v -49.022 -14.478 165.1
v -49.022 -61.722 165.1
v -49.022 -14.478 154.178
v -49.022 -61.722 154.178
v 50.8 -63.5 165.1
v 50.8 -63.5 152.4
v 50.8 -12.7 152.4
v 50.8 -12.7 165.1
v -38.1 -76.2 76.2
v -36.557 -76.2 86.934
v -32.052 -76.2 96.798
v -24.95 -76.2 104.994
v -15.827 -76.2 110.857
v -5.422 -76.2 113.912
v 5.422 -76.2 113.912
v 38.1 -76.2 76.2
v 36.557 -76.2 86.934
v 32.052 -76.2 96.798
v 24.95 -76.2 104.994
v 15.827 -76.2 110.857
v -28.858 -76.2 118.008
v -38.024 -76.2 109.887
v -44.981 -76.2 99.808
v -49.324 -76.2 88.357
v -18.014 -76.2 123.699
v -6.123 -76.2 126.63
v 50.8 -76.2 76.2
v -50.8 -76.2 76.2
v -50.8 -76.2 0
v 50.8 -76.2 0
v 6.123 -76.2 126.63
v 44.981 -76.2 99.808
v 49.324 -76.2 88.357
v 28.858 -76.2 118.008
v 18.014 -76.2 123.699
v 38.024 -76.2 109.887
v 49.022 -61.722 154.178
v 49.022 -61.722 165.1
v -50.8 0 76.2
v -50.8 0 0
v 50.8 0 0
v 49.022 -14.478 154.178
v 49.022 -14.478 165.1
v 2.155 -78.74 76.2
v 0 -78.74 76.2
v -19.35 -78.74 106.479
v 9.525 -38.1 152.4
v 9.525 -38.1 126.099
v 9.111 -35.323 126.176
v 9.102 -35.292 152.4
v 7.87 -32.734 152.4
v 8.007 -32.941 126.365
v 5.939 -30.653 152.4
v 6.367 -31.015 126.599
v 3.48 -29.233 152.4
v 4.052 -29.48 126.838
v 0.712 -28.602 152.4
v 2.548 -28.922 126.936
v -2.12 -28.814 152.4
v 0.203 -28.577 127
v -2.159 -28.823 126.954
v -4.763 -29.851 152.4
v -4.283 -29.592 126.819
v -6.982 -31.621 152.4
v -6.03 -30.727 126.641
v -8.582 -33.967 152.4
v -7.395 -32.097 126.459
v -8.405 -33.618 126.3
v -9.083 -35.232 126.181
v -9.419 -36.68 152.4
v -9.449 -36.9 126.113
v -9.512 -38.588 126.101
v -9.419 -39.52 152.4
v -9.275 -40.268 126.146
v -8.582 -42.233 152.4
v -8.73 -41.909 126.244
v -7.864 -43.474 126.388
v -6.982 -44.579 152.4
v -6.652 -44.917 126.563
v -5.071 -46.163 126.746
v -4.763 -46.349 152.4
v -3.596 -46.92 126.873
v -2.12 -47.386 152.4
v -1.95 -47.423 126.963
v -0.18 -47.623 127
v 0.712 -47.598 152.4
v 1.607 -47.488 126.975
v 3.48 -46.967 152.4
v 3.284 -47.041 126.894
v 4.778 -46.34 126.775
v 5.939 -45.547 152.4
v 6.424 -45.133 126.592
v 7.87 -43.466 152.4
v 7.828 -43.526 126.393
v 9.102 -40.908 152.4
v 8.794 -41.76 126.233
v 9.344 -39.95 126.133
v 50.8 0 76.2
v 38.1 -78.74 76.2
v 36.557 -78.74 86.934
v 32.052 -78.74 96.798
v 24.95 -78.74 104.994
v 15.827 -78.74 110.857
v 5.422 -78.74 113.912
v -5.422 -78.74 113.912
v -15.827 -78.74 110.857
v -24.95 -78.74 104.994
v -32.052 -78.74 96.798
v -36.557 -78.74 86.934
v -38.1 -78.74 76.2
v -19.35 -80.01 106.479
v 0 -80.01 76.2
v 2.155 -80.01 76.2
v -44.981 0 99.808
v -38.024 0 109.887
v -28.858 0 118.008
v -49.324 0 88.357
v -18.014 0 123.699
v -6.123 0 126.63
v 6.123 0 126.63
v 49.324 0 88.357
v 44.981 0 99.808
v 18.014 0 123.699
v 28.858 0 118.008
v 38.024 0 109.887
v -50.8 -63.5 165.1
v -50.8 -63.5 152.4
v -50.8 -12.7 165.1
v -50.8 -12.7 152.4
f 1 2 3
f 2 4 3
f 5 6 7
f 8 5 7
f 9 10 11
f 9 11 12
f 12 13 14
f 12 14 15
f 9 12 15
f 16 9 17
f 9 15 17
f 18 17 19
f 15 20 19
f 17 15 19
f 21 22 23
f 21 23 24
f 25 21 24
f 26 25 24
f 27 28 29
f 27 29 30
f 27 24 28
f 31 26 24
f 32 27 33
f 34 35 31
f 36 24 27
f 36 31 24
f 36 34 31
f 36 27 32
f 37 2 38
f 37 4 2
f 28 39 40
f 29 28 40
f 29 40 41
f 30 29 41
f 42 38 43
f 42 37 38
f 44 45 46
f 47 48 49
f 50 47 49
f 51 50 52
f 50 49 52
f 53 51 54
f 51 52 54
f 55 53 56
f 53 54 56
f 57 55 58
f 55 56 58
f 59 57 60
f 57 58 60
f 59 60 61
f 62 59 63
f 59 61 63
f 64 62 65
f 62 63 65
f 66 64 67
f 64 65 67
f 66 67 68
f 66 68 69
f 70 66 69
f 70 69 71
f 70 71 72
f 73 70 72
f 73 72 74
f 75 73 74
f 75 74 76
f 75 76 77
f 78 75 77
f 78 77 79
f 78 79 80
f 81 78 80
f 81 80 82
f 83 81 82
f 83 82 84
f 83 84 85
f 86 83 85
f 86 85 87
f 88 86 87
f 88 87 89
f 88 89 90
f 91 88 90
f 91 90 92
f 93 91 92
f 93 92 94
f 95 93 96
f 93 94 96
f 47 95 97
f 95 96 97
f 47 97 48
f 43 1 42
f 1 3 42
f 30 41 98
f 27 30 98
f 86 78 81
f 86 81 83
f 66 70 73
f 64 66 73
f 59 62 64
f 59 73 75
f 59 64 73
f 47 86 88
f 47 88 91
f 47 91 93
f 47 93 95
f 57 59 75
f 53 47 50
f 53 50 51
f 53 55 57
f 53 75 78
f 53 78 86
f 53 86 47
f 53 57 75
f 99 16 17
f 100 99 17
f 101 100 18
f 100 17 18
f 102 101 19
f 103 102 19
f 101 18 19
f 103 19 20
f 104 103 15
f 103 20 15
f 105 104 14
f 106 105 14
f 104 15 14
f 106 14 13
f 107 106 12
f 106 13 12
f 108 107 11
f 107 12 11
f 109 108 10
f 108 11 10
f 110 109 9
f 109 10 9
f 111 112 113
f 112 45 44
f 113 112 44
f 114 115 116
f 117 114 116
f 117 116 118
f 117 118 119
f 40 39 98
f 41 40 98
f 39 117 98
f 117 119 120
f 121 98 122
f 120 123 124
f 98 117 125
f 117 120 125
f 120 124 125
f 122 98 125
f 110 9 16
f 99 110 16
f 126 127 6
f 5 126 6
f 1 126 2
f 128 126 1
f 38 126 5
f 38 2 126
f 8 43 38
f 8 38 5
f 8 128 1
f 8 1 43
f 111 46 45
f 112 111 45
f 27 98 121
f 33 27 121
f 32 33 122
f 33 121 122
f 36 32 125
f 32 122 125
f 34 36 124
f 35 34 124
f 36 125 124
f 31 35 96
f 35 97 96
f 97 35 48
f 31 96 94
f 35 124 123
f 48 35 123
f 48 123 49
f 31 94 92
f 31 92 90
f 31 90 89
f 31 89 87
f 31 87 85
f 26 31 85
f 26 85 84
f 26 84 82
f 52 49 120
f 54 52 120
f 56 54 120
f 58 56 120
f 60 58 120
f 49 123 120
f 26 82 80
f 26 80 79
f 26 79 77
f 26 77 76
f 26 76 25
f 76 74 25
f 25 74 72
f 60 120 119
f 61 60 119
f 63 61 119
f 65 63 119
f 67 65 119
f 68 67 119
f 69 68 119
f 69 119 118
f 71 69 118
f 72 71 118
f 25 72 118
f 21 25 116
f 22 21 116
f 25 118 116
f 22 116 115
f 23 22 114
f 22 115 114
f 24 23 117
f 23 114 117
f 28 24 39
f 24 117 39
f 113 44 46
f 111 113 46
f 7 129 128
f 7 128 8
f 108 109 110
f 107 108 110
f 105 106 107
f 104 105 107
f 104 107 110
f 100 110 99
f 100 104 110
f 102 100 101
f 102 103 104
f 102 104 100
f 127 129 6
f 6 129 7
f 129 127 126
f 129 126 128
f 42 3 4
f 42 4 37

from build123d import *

# Parameters (mm, degrees)
F1_DEPTH = 76.2
F3_DEPTH = 2.54
F5_DEPTH = 1.27
F6_R     = 9.525
F7_DEPTH = 152.4
F8_W     = 101.6
F8_H     = 50.8
F8_R     = 9.525
F9_DEPTH = 12.7
F10_T    = -1.778


with BuildPart() as f1:
    # F0 (on Front) → F1 (new body)
    with BuildSketch(Plane.XZ):
        with BuildLine():
            Line((-50.8, 76.2), (-50.8, 0))
            Line((-50.8, 0), (50.8, 0))
            Line((50.8, 0), (50.8, 76.2))
            ThreePointArc((50.8, 76.2), (0, 127), (-50.8, 76.2))
        make_face()
    extrude(amount=F1_DEPTH)

    # F6 (on Top) → F7 (join)
    with BuildSketch(Plane.XY):
        with Locations((0, -38.1)):
            Circle(F6_R)
    extrude(amount=F7_DEPTH)


with BuildPart() as f3:
    # F2 (on face) → F3 (new body)
    with BuildSketch(Plane.XZ.offset(76.2)):
        with BuildLine():
            ThreePointArc((38.1, 76.2), (0, 114.3), (-38.1, 76.2))
            Line((-38.1, 76.2), (38.1, 76.2))
        make_face()
    extrude(amount=F3_DEPTH)


with BuildPart() as f5:
    # F4 (on face) → F5 (new body)
    with BuildSketch(Plane.XZ.offset(78.74)):
        Polygon((-19.35011, 106.478661), (0, 76.2), (2.154625, 76.2), align=None)
    extrude(amount=F5_DEPTH)


with BuildPart() as f9:
    # F8 (on face) → F9 (new body)
    with BuildSketch(Plane.XY.offset(152.4)):
        with Locations((0, -38.1)):
            Rectangle(F8_W, F8_H)
        with Locations((0, -38.1)):
            Circle(F8_R, mode=Mode.SUBTRACT)
        with Locations((0, -38.1)):
            Circle(F8_R)
    extrude(amount=F9_DEPTH)

    # F10
    f10_openings = [f9.faces().sort_by_distance(p)[0] for p in [
        (0, -38.1, 165.1),
    ]]
    offset(amount=F10_T, openings=f10_openings)


solid = Compound([f1.part, f3.part, f5.part, f9.part])
